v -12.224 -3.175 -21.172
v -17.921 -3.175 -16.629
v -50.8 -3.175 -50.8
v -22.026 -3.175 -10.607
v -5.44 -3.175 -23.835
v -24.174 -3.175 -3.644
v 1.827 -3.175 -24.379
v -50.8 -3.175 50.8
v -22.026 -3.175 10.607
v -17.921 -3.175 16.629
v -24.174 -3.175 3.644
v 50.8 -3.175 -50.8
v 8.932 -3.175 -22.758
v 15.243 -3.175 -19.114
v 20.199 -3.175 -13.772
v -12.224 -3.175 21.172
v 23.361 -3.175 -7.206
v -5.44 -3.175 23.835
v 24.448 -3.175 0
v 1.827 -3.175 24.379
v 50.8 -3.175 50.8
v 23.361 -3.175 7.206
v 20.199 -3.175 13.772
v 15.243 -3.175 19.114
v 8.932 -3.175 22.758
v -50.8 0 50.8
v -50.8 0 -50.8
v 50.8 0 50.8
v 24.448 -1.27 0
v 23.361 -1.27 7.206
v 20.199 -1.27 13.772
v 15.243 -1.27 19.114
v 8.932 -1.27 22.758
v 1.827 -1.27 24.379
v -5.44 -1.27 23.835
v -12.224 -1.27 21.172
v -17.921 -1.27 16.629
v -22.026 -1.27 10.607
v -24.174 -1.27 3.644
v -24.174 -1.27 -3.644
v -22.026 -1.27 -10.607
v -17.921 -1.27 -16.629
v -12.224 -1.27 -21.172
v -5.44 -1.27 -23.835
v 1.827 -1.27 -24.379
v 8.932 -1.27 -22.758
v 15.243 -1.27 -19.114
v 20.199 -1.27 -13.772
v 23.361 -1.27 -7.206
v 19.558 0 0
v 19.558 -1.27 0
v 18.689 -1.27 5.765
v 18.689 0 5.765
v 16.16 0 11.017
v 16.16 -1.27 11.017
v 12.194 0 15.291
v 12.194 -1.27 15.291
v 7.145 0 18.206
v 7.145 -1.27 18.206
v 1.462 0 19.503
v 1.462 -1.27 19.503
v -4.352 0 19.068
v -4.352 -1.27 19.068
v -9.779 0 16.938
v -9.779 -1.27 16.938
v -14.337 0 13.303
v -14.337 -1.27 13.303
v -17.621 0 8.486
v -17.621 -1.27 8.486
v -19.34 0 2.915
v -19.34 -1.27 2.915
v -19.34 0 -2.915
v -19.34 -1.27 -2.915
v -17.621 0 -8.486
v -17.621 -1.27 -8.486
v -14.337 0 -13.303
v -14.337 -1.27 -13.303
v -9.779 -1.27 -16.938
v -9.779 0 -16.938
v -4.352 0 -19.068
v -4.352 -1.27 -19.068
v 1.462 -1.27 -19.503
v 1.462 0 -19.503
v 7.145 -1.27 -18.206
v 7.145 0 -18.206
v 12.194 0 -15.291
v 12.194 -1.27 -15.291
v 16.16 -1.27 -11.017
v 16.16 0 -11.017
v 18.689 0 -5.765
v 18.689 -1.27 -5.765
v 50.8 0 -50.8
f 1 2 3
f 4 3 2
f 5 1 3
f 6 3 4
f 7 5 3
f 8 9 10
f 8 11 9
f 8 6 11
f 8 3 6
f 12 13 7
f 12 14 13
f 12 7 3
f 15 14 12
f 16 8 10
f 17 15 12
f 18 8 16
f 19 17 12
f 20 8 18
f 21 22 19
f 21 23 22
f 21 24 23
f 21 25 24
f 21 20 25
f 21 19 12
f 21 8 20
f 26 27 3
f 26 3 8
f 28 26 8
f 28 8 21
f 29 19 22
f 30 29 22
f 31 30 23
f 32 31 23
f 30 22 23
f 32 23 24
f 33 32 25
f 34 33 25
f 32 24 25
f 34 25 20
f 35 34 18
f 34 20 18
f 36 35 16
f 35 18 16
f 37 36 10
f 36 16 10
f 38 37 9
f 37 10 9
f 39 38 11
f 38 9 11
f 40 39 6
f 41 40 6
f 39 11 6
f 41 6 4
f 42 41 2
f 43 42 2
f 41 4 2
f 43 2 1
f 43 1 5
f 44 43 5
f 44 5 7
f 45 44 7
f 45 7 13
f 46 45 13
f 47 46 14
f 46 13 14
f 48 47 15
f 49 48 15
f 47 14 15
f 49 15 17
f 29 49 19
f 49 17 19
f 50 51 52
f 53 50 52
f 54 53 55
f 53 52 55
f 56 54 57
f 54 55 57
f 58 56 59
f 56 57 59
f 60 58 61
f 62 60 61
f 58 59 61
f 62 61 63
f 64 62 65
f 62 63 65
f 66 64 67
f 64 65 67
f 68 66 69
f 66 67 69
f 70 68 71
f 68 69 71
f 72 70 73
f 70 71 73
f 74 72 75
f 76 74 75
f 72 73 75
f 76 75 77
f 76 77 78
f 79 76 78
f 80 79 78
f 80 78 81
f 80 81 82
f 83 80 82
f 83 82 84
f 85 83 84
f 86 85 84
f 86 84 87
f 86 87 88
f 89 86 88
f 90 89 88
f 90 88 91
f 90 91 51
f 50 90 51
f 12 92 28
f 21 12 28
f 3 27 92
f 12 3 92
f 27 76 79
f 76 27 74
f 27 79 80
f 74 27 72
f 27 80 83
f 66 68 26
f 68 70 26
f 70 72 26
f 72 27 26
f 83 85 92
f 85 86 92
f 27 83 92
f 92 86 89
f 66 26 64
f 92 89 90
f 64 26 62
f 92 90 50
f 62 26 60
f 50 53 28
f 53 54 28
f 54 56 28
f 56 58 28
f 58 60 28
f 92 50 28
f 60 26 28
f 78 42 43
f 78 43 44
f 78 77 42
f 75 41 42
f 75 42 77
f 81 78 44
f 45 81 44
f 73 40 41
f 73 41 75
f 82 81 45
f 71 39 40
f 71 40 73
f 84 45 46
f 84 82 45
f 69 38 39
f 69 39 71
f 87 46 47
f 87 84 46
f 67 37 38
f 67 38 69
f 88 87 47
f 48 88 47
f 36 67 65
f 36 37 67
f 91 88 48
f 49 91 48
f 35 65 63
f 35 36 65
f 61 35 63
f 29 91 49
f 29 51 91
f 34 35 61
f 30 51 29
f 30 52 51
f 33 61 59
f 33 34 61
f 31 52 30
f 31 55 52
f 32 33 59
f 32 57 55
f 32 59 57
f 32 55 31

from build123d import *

# Parameters (mm, degrees)
F0_W     = 101.6
F0_H     = 101.6
F1_DEPTH = 3.175
F2_R     = 19.558
F3_DEPTH = 3.176
F4_R     = 24.4475
F5_DEPTH = 1.905


with BuildPart() as f1:
    # F0 (on Front) → F1 (new body)
    with BuildSketch(Plane.XZ):
        Rectangle(F0_W, F0_H)
    extrude(amount=F1_DEPTH)

    # F2 (on face) → F3 (cut, through all)
    with BuildSketch(Plane.XZ.offset(3.175)):
        Circle(F2_R)
    extrude(amount=-F3_DEPTH, mode=Mode.SUBTRACT)

    # F4 (on face) → F5 (cut)
    with BuildSketch(Plane.XZ.offset(3.175)):
        Circle(F4_R)
    extrude(amount=-F5_DEPTH, mode=Mode.SUBTRACT)


solid = f1.part
